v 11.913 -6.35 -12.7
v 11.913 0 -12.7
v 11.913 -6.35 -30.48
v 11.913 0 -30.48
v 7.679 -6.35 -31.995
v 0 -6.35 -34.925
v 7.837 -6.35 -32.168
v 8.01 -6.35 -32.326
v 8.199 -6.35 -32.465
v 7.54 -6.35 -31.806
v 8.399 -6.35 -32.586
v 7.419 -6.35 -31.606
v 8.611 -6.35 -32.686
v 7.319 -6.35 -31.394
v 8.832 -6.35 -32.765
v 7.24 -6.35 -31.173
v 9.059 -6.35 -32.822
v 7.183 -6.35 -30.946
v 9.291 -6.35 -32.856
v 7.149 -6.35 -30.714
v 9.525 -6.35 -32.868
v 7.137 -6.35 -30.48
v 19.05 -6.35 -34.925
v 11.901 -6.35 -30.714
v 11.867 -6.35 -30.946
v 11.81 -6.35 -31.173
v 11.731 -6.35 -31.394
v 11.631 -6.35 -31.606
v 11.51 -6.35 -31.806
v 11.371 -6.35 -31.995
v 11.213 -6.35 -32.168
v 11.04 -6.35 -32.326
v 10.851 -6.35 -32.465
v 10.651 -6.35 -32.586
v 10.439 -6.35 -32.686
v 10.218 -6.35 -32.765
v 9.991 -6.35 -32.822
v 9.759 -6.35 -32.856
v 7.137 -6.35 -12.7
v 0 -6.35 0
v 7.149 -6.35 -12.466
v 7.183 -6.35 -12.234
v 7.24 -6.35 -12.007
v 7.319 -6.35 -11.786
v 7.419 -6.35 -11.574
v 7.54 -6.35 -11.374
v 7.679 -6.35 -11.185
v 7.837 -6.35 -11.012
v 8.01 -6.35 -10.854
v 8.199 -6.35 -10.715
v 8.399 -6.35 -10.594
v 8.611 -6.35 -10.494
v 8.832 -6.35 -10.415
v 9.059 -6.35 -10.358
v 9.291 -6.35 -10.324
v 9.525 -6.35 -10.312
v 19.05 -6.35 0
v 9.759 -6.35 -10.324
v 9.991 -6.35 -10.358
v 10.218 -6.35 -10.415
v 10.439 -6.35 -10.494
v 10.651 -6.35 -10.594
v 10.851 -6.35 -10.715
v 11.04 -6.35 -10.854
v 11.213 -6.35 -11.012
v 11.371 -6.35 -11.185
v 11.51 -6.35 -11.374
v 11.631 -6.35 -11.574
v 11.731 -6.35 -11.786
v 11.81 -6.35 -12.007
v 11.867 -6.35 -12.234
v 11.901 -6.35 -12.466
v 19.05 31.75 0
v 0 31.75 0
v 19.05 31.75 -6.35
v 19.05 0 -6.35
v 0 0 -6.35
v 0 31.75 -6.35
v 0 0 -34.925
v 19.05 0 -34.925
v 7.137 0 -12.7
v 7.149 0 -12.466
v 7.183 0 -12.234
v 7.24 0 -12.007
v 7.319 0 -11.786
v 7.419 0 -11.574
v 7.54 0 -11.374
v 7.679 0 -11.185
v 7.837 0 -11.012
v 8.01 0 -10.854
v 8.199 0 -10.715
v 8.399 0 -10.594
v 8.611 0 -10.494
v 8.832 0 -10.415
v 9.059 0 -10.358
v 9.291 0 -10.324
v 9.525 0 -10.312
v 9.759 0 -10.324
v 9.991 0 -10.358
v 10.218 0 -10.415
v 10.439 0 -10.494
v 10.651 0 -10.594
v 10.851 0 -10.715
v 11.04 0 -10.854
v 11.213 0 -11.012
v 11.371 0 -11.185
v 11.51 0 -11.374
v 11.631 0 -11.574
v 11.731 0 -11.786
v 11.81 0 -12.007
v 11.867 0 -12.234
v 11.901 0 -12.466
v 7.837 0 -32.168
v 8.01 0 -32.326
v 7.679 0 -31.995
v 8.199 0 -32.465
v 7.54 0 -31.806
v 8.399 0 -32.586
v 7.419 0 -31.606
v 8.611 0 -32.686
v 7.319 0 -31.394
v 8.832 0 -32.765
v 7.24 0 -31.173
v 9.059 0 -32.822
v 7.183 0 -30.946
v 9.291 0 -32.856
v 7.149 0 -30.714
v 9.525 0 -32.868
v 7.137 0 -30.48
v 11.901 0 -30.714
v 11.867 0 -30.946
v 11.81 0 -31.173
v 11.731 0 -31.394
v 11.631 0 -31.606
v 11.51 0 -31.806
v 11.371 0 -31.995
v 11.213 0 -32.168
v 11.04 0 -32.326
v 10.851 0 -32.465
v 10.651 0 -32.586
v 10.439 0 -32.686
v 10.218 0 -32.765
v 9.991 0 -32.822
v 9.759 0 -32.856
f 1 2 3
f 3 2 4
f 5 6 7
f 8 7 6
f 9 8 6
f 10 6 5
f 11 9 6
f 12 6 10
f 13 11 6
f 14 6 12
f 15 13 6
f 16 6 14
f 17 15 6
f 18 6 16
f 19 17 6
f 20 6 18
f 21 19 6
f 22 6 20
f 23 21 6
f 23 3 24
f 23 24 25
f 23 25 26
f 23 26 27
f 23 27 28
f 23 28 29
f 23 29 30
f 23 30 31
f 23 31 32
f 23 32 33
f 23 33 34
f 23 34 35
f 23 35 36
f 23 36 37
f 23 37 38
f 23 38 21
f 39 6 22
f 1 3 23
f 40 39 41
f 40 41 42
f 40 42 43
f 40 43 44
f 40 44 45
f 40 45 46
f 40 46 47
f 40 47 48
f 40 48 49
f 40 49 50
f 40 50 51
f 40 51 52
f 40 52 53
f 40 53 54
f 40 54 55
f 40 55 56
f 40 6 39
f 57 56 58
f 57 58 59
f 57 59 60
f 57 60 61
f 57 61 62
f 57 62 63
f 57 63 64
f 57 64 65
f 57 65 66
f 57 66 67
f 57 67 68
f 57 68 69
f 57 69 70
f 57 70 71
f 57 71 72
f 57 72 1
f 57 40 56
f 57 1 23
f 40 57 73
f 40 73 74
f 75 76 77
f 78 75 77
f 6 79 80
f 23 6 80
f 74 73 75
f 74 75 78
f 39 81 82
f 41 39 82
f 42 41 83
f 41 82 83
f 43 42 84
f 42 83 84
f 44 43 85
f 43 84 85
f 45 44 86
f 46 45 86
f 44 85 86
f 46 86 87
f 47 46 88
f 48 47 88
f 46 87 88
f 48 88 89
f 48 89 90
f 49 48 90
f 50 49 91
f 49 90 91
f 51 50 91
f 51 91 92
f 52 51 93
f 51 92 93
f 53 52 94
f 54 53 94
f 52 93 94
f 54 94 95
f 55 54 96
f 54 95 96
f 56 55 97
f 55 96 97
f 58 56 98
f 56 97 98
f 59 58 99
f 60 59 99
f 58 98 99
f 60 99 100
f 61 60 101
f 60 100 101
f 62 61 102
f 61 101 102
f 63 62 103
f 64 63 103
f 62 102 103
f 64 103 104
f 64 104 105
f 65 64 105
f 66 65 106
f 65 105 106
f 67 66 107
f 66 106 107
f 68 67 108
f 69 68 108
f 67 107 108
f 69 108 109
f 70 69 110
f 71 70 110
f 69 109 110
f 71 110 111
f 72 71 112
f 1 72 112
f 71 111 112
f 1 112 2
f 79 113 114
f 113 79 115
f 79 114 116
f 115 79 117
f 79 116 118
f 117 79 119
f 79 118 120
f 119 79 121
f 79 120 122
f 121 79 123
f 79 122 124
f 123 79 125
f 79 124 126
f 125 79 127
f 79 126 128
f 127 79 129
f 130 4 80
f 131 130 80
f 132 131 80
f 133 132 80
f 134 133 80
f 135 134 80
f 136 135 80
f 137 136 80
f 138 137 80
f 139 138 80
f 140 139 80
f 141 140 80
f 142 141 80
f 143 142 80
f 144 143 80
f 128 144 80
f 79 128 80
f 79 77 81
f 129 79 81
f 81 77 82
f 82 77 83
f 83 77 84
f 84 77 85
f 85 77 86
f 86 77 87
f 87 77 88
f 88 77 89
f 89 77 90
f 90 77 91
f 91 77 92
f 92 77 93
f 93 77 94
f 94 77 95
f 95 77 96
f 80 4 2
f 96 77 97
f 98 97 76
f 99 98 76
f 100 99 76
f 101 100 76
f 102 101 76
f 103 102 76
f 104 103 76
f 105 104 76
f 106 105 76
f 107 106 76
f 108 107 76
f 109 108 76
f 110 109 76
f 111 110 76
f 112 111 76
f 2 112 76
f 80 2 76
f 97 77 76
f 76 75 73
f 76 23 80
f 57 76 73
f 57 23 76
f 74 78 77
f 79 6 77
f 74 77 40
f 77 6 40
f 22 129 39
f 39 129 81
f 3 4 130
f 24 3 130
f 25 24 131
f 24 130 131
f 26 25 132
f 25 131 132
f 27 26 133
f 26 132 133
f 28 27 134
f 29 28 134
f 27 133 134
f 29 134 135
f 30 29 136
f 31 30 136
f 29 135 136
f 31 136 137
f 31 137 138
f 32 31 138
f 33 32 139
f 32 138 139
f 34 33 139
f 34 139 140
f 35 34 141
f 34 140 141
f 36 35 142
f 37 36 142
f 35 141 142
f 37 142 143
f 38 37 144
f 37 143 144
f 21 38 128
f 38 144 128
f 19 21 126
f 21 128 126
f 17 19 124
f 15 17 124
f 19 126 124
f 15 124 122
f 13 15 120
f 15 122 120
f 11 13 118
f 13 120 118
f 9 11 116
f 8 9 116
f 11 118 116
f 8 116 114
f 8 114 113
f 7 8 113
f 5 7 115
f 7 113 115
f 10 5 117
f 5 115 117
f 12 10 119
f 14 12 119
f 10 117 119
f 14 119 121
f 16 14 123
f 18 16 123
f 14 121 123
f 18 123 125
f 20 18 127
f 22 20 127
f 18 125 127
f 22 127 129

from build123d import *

# Parameters (mm, degrees)
F0_W     = 19.05
F0_H     = 34.925
F1_DEPTH = 6.35
F2_W     = 19.05
F2_H     = 6.35
F3_DEPTH = 31.75


with BuildPart() as f1:
    # F0 (on Front) → F1 (new body)
    with BuildSketch(Plane.XZ):
        with Locations((9.525, -17.4625)):
            Rectangle(F0_W, F0_H)
        with BuildLine():
            ThreePointArc((7.1374, -12.7), (9.525, -10.3124), (11.9126, -12.7))
            Line((11.9126, -12.7), (11.9126, -30.48))
            ThreePointArc((11.9126, -30.48), (9.525, -32.8676), (7.1374, -30.48))
            Line((7.1374, -30.48), (7.1374, -12.7))
        make_face(mode=Mode.SUBTRACT)
    extrude(amount=F1_DEPTH)

    # F2 (on face) → F3 (join)
    with BuildSketch(Plane(origin=(0, 0, 0), x_dir=(-1, 0, 0), z_dir=(0, 1, 0))):
        with Locations((-9.525, -3.175)):
            Rectangle(F2_W, F2_H)
    extrude(amount=F3_DEPTH)


solid = f1.part
